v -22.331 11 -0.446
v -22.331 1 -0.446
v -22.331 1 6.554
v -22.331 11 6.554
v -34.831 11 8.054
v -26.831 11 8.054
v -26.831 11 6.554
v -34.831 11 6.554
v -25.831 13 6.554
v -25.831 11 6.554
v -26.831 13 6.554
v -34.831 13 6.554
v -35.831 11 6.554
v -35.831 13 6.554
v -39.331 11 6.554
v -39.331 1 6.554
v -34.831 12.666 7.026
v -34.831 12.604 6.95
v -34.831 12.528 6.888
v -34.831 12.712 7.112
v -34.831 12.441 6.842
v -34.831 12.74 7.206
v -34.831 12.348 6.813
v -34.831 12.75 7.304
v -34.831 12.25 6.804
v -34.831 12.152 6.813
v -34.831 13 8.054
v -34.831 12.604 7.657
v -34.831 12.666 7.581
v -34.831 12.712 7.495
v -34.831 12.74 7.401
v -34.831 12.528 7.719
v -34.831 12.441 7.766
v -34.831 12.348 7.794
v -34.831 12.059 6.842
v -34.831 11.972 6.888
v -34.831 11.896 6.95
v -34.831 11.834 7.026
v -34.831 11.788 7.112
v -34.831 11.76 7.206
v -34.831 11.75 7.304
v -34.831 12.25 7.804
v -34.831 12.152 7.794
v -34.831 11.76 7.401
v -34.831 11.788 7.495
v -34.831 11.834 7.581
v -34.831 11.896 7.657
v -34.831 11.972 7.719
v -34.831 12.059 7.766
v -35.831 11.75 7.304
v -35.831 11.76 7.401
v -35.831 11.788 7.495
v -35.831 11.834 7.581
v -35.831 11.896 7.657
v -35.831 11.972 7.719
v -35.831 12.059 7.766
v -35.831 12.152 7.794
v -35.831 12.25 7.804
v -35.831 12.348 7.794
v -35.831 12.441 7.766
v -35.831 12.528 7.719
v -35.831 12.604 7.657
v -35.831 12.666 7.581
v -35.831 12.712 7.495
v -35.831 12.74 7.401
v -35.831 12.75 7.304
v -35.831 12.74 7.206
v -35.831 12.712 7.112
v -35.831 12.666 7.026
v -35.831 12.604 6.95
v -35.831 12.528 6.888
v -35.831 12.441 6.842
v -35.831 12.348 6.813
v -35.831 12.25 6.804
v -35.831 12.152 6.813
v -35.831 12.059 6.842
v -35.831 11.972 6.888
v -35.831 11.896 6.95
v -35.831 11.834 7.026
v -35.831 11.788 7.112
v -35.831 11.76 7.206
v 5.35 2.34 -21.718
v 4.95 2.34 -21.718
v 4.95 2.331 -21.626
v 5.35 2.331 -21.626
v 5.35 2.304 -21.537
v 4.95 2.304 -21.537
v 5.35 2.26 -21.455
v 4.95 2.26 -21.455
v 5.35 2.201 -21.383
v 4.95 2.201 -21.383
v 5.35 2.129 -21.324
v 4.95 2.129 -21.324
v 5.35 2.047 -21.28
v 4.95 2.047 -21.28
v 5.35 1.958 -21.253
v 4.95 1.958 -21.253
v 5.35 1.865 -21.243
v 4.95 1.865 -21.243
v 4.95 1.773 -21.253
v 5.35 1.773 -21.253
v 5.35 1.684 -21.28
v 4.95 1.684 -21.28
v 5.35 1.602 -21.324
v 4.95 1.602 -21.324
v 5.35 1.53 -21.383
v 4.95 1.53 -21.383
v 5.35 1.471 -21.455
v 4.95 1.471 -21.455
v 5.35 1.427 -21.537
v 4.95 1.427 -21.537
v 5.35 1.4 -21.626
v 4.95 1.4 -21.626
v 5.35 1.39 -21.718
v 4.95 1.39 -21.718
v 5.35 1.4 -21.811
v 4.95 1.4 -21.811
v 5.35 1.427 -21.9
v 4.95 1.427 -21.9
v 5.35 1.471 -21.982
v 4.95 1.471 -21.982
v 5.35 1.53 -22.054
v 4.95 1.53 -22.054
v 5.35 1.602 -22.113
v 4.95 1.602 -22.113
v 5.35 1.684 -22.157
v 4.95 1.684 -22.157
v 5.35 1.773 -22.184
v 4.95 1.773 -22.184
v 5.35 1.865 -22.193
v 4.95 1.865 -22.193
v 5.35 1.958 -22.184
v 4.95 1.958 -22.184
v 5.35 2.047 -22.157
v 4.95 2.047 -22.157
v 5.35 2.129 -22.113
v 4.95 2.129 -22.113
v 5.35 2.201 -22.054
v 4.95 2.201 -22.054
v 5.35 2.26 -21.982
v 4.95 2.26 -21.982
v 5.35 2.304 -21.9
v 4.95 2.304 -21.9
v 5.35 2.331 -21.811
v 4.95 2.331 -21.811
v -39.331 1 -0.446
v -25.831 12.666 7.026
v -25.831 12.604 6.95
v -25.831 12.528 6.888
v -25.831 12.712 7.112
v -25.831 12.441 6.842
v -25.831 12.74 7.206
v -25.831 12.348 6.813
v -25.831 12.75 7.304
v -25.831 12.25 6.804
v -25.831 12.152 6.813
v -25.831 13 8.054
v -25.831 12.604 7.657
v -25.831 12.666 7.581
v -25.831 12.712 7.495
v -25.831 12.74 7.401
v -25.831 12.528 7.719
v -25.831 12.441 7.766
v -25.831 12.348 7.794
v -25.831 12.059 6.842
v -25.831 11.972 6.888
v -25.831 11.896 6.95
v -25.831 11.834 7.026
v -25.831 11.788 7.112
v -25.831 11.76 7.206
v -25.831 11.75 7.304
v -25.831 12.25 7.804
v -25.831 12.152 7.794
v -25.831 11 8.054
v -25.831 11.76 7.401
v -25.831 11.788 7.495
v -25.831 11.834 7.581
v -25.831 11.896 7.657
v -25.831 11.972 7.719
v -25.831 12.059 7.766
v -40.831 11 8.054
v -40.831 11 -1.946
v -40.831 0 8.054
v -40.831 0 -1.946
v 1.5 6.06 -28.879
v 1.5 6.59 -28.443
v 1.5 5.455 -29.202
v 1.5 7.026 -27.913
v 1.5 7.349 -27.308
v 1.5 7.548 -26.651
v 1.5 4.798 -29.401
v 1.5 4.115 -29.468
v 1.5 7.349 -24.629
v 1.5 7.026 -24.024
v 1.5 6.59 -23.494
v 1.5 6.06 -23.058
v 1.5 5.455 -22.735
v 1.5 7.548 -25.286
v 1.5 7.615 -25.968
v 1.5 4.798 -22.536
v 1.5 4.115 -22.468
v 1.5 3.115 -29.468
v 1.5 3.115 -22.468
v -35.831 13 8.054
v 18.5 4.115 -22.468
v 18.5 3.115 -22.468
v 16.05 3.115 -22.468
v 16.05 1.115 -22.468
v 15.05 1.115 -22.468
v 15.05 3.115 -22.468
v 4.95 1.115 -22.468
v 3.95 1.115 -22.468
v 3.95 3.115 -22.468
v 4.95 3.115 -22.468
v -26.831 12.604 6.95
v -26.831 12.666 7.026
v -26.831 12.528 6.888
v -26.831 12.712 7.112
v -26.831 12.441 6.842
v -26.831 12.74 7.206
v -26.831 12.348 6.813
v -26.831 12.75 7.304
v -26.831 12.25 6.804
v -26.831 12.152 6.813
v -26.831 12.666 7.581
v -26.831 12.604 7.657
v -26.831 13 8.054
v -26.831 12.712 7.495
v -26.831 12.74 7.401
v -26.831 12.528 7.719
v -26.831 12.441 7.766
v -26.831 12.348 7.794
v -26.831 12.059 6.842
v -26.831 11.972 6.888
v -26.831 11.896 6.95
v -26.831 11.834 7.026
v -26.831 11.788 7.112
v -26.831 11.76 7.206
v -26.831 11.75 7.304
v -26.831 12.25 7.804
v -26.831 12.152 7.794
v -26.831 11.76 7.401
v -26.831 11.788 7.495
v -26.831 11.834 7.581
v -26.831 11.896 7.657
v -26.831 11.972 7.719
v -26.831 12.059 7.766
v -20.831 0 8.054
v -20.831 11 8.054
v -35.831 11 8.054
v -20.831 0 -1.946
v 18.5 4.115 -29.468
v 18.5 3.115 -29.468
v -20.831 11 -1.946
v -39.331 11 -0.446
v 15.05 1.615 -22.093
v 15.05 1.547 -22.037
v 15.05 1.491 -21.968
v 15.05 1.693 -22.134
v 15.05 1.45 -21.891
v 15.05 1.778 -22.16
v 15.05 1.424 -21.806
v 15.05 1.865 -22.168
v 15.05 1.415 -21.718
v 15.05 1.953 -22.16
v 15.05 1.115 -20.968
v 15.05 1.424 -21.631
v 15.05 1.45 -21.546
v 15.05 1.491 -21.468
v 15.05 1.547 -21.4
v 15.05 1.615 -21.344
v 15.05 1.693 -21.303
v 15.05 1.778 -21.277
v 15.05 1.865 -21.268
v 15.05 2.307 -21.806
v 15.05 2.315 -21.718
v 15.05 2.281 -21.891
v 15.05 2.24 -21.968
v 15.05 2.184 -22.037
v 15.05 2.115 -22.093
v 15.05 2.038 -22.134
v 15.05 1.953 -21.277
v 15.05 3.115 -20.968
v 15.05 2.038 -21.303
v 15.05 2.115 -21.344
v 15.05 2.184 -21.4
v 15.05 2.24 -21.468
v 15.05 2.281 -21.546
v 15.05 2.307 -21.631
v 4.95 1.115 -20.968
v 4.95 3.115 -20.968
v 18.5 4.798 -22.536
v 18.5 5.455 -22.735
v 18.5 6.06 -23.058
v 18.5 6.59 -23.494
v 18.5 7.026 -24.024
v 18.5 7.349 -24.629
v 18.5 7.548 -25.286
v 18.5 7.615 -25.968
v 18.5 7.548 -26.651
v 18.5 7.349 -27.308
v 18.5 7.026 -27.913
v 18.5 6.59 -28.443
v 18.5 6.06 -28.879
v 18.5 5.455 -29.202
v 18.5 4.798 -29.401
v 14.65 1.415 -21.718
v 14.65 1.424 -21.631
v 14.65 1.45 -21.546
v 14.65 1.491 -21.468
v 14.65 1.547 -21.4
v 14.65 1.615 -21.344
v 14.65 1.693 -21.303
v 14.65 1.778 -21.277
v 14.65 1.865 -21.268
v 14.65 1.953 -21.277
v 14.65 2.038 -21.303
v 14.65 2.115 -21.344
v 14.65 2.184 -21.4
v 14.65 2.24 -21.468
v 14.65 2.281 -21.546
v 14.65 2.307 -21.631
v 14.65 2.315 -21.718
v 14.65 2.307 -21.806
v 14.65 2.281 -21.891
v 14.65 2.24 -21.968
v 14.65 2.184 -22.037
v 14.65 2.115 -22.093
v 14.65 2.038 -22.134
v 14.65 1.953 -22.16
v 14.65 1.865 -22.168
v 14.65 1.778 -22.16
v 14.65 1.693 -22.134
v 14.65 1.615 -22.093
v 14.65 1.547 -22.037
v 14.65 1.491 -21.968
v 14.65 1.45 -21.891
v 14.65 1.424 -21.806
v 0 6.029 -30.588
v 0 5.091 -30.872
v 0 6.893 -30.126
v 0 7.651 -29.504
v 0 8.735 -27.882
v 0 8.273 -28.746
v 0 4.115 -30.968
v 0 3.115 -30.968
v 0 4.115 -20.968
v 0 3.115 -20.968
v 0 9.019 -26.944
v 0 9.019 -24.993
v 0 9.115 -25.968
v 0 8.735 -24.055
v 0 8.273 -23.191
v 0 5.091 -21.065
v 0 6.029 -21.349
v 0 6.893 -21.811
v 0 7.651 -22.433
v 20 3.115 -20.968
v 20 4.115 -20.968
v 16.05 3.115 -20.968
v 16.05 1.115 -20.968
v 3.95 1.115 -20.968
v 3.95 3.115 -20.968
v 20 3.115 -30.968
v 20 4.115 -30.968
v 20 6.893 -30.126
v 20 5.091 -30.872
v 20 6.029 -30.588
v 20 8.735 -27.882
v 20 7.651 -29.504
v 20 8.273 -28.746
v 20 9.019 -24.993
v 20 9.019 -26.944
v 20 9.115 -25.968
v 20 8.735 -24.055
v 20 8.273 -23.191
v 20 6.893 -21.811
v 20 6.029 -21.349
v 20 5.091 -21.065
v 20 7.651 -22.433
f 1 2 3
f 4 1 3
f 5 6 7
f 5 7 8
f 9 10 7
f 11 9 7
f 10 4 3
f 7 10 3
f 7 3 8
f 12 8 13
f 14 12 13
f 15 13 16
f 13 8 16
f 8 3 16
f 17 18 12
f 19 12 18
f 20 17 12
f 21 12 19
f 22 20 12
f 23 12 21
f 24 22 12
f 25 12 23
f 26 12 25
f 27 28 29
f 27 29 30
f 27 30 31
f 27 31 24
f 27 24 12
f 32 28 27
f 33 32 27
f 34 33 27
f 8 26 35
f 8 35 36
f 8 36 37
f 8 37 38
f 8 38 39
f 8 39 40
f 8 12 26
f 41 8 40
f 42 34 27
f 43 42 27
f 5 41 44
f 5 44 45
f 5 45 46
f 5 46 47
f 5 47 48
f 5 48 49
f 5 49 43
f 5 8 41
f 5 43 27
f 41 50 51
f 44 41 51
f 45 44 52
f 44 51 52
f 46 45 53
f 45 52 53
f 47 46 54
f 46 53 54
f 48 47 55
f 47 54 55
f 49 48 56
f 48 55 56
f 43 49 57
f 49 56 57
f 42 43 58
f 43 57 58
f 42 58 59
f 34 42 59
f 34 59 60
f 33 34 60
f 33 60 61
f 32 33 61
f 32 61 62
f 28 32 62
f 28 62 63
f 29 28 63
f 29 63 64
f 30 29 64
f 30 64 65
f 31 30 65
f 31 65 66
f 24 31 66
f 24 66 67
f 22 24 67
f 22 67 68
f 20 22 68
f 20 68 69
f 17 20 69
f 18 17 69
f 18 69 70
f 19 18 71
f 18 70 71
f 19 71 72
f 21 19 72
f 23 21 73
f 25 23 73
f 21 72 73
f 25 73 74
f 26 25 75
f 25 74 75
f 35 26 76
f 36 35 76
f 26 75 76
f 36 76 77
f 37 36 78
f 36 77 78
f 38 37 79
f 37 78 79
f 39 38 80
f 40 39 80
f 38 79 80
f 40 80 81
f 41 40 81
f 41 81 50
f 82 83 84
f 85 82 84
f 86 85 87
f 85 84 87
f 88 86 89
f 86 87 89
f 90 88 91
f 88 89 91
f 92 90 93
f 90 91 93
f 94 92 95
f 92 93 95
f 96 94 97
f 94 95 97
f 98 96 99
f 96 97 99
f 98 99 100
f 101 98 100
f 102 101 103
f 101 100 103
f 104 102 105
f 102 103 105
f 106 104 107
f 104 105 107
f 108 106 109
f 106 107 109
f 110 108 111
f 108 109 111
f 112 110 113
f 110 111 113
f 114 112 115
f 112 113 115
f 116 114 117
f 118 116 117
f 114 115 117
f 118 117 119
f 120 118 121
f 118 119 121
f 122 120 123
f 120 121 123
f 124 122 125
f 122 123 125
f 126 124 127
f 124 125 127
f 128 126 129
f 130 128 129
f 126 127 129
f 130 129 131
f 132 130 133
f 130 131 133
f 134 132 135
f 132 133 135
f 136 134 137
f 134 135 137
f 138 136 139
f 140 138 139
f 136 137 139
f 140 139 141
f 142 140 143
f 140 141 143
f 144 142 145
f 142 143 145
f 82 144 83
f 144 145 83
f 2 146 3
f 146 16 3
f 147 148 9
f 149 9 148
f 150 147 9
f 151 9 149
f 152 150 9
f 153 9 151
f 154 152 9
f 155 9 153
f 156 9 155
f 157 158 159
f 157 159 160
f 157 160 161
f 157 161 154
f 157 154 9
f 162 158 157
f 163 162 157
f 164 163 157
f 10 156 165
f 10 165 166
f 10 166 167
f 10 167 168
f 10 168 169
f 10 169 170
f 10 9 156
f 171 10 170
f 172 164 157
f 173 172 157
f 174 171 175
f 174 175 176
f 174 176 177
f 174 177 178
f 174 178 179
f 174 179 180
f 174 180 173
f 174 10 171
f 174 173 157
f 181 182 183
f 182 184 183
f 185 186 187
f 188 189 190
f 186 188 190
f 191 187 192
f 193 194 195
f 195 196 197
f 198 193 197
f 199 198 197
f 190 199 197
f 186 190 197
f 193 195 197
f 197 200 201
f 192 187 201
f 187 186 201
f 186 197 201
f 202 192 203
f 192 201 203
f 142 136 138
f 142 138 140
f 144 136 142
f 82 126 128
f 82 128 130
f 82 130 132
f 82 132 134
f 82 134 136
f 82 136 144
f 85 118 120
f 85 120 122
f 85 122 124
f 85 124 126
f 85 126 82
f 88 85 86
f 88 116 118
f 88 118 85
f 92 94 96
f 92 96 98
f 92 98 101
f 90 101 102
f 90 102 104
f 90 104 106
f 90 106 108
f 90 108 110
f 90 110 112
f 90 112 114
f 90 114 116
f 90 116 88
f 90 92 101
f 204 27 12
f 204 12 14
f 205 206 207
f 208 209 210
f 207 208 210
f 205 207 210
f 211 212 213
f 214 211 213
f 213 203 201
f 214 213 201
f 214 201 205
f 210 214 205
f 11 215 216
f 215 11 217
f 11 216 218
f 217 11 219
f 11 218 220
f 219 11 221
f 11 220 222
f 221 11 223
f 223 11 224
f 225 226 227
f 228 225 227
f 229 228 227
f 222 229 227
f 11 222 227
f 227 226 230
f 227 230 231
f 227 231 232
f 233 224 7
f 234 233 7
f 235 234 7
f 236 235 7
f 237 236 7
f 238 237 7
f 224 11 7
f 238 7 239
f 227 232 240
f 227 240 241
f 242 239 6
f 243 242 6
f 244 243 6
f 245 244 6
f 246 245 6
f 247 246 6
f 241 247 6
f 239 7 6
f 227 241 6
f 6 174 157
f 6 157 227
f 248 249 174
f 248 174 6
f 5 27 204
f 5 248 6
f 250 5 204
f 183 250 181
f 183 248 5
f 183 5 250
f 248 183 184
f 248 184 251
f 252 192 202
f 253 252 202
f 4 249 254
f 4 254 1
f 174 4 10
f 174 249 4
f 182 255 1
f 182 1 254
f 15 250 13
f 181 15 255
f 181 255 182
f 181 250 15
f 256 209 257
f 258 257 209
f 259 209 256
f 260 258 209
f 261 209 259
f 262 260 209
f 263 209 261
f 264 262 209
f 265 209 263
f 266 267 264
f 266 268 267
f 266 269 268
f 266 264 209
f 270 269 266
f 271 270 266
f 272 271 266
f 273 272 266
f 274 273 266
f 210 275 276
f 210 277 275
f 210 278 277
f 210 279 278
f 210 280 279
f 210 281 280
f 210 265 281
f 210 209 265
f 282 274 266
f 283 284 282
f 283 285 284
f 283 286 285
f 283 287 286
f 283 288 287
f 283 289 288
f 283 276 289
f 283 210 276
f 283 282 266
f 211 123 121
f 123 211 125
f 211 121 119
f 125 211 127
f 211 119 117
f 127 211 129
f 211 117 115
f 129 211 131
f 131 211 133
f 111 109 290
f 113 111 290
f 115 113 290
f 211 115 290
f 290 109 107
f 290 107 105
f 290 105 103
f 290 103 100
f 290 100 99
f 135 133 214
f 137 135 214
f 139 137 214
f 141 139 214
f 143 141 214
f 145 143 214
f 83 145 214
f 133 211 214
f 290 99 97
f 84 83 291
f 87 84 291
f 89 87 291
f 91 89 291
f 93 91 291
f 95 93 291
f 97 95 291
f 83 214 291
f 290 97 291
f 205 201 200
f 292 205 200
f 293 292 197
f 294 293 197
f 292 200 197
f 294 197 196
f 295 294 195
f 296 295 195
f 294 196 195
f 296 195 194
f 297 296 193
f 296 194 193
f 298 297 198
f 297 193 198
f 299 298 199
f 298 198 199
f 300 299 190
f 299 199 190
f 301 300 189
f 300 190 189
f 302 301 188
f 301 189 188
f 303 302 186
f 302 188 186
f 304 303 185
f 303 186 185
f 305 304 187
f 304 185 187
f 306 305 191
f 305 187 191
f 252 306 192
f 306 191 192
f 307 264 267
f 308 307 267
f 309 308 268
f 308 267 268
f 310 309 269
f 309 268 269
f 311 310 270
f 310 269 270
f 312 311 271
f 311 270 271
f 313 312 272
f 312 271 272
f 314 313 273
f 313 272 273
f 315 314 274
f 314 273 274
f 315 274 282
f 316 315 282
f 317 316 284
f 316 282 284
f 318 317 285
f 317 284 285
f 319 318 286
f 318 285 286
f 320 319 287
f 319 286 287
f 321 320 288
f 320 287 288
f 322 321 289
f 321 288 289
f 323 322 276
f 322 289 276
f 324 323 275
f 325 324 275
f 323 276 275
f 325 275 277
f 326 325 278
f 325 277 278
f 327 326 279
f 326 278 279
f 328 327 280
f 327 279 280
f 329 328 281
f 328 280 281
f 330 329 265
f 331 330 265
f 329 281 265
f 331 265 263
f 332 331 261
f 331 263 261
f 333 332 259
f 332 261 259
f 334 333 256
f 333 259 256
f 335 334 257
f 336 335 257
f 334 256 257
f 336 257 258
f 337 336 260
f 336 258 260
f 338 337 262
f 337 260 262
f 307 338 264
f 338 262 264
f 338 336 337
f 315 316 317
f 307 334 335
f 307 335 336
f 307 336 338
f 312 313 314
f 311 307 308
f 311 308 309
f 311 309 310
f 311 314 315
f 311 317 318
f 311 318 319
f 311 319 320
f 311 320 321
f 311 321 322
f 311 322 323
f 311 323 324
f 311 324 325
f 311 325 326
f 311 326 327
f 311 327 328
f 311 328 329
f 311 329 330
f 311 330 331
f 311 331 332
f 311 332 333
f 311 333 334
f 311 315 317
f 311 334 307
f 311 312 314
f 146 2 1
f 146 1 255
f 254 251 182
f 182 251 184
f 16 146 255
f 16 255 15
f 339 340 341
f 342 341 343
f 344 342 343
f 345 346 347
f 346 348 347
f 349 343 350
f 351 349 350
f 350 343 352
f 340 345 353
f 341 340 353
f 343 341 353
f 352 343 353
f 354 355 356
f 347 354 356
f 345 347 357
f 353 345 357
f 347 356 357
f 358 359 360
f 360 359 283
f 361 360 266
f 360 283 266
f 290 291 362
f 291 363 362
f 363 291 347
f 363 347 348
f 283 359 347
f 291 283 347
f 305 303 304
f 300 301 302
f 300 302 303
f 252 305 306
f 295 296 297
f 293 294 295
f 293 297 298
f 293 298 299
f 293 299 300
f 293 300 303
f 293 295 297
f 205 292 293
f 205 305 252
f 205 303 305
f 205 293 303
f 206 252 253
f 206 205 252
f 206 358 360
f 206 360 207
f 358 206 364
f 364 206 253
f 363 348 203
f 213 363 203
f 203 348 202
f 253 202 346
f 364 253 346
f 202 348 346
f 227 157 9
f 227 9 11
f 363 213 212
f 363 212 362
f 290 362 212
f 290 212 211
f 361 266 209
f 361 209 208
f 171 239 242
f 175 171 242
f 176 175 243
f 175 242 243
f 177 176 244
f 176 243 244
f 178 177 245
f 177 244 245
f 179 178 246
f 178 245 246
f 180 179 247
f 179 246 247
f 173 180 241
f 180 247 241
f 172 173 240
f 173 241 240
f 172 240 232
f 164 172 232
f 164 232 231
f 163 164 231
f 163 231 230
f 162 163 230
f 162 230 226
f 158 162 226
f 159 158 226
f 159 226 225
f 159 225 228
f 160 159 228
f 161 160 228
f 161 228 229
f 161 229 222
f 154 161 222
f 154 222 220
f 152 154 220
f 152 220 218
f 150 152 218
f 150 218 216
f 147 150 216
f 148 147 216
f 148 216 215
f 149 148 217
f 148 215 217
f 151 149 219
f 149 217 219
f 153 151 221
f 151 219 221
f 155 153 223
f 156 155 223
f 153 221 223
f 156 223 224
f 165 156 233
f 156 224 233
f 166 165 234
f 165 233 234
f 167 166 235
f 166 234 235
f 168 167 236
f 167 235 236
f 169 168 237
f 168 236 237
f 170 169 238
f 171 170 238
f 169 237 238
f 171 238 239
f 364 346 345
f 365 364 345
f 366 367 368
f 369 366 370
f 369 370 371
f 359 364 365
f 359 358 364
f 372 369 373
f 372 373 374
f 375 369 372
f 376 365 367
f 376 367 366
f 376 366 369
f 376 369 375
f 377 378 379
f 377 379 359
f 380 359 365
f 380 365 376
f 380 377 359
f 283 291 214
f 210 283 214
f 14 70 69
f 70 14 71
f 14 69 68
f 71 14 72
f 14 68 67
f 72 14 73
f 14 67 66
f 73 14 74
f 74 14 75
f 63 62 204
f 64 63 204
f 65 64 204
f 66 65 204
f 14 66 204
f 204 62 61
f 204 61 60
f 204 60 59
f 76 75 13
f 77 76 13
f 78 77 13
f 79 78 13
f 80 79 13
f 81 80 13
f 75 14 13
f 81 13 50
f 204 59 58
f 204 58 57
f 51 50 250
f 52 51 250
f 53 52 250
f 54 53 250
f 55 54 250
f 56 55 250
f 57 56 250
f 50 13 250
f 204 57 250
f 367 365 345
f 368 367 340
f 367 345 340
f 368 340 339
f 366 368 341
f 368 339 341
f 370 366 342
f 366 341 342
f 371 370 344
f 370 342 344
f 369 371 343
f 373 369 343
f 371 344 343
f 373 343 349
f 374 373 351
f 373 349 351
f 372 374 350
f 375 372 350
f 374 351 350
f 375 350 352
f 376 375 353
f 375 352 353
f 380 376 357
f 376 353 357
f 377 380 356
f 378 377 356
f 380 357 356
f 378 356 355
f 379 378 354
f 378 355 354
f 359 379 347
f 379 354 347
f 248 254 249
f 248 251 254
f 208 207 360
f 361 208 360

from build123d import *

# Parameters (mm, degrees)
F0_W      = 20
F0_H      = 10
F1_DEPTH  = 1
F2_W      = 20
F2_H      = 10
F2_W_2    = 17
F2_H_2    = 7
F3_DEPTH  = 10
F4_W      = 1
F4_H      = 1.5
F5_DEPTH  = 2
F6_R      = 0.5
F7_DEPTH  = 25
F9_DEPTH  = 20
F12_DEPTH = 17
F13_W     = 1
F13_H     = 1.5
F14_DEPTH = 2
F15_R     = 0.45
F16_DEPTH = 0.4
F17_R     = 0.475
F18_DEPTH = 0.4


with BuildPart() as f1:
    # F0 (on Front) → F1 (new body)
    with BuildSketch(Plane.XZ):
        with Locations((-30.8312657289, 3.0536208428)):
            Rectangle(F0_W, F0_H)
    extrude(amount=-F1_DEPTH)

    # F2 (on face) → F3 (join)
    with BuildSketch(Plane(origin=(0, 1, 0), x_dir=(-1, 0, 0), z_dir=(0, 1, 0))):
        with Locations((30.8312657289, 3.0536208428)):
            Rectangle(F2_W, F2_H)
        with Locations((30.8312657289, 3.0536208428)):
            Rectangle(F2_W_2, F2_H_2, mode=Mode.SUBTRACT)
    extrude(amount=F3_DEPTH)

    # F4 (on face) → F5 (join)
    with BuildSketch(Plane(origin=(0, 11, 0), x_dir=(-1, 0, 0), z_dir=(0, 1, 0))):
        with Locations((26.3312657289, 7.3036208428)):
            Rectangle(F4_W, F4_H)
        with Locations((35.3312657289, 7.3036208428)):
            Rectangle(F4_W, F4_H)
    extrude(amount=F5_DEPTH)

    # F6 (on face) → F7 (cut)
    with BuildSketch(Plane(origin=(-35.8312657289, 0, 0), x_dir=(0, -1, 0), z_dir=(-1, 0, 0))):
        with Locations((-12.25, 7.3036208428)):
            Circle(F6_R)
    extrude(amount=-F7_DEPTH, mode=Mode.SUBTRACT)


with BuildPart() as f9:
    # F8 (on Right) → F9 (new body)
    with BuildSketch(Plane.YZ):
        with BuildLine():
            Line((3.1154813953, -30.9684574604), (4.1154813953, -30.9684574604))
            ThreePointArc((4.1154813953, -30.9684574604), (9.1154813953, -25.9684574604), (4.1154813953, -20.9684574604))
            Line((4.1154813953, -20.9684574604), (3.1154813953, -20.9684574604))
            Line((3.1154813953, -20.9684574604), (3.1154813953, -30.9684574604))
        make_face()
    extrude(amount=F9_DEPTH)

    # F11 (on offset) → F12 (cut)
    with BuildSketch(Plane(origin=(1.5, 0, 0), x_dir=(0, -1, 0), z_dir=(-1, 0, 0))):
        with BuildLine():
            Line((-3.1154813953, -29.4684574604), (-3.1154813953, -22.4684574604))
            Line((-3.1154813953, -22.4684574604), (-4.1154813953, -22.4684574604))
            ThreePointArc((-4.1154813953, -22.4684574604), (-7.6154813953, -25.9684574604), (-4.1154813953, -29.4684574604))
            Line((-4.1154813953, -29.4684574604), (-3.1154813953, -29.4684574604))
        make_face()
    extrude(amount=-F12_DEPTH, mode=Mode.SUBTRACT)

    # F13 (on face) → F14 (join)
    with BuildSketch(Plane.XZ.offset(-3.1154813953)):
        with Locations((4.45, -21.7184574604)):
            Rectangle(F13_W, F13_H)
        with Locations((15.55, -21.7184574604)):
            Rectangle(F13_W, F13_H)
    extrude(amount=F14_DEPTH)

    # F15 (on face) → F16 (join)
    with BuildSketch(Plane(origin=(15.05, 0, 0), x_dir=(0, -1, 0), z_dir=(-1, 0, 0))):
        with Locations((-1.8654813953, -21.7184574604)):
            Circle(F15_R)
    extrude(amount=F16_DEPTH)

    # F17 (on face) → F18 (join)
    with BuildSketch(Plane.YZ.offset(4.95)):
        with Locations((1.8654813953, -21.7184574604)):
            Circle(F17_R)
    extrude(amount=F18_DEPTH)


solid = Compound([f1.part, f9.part])
